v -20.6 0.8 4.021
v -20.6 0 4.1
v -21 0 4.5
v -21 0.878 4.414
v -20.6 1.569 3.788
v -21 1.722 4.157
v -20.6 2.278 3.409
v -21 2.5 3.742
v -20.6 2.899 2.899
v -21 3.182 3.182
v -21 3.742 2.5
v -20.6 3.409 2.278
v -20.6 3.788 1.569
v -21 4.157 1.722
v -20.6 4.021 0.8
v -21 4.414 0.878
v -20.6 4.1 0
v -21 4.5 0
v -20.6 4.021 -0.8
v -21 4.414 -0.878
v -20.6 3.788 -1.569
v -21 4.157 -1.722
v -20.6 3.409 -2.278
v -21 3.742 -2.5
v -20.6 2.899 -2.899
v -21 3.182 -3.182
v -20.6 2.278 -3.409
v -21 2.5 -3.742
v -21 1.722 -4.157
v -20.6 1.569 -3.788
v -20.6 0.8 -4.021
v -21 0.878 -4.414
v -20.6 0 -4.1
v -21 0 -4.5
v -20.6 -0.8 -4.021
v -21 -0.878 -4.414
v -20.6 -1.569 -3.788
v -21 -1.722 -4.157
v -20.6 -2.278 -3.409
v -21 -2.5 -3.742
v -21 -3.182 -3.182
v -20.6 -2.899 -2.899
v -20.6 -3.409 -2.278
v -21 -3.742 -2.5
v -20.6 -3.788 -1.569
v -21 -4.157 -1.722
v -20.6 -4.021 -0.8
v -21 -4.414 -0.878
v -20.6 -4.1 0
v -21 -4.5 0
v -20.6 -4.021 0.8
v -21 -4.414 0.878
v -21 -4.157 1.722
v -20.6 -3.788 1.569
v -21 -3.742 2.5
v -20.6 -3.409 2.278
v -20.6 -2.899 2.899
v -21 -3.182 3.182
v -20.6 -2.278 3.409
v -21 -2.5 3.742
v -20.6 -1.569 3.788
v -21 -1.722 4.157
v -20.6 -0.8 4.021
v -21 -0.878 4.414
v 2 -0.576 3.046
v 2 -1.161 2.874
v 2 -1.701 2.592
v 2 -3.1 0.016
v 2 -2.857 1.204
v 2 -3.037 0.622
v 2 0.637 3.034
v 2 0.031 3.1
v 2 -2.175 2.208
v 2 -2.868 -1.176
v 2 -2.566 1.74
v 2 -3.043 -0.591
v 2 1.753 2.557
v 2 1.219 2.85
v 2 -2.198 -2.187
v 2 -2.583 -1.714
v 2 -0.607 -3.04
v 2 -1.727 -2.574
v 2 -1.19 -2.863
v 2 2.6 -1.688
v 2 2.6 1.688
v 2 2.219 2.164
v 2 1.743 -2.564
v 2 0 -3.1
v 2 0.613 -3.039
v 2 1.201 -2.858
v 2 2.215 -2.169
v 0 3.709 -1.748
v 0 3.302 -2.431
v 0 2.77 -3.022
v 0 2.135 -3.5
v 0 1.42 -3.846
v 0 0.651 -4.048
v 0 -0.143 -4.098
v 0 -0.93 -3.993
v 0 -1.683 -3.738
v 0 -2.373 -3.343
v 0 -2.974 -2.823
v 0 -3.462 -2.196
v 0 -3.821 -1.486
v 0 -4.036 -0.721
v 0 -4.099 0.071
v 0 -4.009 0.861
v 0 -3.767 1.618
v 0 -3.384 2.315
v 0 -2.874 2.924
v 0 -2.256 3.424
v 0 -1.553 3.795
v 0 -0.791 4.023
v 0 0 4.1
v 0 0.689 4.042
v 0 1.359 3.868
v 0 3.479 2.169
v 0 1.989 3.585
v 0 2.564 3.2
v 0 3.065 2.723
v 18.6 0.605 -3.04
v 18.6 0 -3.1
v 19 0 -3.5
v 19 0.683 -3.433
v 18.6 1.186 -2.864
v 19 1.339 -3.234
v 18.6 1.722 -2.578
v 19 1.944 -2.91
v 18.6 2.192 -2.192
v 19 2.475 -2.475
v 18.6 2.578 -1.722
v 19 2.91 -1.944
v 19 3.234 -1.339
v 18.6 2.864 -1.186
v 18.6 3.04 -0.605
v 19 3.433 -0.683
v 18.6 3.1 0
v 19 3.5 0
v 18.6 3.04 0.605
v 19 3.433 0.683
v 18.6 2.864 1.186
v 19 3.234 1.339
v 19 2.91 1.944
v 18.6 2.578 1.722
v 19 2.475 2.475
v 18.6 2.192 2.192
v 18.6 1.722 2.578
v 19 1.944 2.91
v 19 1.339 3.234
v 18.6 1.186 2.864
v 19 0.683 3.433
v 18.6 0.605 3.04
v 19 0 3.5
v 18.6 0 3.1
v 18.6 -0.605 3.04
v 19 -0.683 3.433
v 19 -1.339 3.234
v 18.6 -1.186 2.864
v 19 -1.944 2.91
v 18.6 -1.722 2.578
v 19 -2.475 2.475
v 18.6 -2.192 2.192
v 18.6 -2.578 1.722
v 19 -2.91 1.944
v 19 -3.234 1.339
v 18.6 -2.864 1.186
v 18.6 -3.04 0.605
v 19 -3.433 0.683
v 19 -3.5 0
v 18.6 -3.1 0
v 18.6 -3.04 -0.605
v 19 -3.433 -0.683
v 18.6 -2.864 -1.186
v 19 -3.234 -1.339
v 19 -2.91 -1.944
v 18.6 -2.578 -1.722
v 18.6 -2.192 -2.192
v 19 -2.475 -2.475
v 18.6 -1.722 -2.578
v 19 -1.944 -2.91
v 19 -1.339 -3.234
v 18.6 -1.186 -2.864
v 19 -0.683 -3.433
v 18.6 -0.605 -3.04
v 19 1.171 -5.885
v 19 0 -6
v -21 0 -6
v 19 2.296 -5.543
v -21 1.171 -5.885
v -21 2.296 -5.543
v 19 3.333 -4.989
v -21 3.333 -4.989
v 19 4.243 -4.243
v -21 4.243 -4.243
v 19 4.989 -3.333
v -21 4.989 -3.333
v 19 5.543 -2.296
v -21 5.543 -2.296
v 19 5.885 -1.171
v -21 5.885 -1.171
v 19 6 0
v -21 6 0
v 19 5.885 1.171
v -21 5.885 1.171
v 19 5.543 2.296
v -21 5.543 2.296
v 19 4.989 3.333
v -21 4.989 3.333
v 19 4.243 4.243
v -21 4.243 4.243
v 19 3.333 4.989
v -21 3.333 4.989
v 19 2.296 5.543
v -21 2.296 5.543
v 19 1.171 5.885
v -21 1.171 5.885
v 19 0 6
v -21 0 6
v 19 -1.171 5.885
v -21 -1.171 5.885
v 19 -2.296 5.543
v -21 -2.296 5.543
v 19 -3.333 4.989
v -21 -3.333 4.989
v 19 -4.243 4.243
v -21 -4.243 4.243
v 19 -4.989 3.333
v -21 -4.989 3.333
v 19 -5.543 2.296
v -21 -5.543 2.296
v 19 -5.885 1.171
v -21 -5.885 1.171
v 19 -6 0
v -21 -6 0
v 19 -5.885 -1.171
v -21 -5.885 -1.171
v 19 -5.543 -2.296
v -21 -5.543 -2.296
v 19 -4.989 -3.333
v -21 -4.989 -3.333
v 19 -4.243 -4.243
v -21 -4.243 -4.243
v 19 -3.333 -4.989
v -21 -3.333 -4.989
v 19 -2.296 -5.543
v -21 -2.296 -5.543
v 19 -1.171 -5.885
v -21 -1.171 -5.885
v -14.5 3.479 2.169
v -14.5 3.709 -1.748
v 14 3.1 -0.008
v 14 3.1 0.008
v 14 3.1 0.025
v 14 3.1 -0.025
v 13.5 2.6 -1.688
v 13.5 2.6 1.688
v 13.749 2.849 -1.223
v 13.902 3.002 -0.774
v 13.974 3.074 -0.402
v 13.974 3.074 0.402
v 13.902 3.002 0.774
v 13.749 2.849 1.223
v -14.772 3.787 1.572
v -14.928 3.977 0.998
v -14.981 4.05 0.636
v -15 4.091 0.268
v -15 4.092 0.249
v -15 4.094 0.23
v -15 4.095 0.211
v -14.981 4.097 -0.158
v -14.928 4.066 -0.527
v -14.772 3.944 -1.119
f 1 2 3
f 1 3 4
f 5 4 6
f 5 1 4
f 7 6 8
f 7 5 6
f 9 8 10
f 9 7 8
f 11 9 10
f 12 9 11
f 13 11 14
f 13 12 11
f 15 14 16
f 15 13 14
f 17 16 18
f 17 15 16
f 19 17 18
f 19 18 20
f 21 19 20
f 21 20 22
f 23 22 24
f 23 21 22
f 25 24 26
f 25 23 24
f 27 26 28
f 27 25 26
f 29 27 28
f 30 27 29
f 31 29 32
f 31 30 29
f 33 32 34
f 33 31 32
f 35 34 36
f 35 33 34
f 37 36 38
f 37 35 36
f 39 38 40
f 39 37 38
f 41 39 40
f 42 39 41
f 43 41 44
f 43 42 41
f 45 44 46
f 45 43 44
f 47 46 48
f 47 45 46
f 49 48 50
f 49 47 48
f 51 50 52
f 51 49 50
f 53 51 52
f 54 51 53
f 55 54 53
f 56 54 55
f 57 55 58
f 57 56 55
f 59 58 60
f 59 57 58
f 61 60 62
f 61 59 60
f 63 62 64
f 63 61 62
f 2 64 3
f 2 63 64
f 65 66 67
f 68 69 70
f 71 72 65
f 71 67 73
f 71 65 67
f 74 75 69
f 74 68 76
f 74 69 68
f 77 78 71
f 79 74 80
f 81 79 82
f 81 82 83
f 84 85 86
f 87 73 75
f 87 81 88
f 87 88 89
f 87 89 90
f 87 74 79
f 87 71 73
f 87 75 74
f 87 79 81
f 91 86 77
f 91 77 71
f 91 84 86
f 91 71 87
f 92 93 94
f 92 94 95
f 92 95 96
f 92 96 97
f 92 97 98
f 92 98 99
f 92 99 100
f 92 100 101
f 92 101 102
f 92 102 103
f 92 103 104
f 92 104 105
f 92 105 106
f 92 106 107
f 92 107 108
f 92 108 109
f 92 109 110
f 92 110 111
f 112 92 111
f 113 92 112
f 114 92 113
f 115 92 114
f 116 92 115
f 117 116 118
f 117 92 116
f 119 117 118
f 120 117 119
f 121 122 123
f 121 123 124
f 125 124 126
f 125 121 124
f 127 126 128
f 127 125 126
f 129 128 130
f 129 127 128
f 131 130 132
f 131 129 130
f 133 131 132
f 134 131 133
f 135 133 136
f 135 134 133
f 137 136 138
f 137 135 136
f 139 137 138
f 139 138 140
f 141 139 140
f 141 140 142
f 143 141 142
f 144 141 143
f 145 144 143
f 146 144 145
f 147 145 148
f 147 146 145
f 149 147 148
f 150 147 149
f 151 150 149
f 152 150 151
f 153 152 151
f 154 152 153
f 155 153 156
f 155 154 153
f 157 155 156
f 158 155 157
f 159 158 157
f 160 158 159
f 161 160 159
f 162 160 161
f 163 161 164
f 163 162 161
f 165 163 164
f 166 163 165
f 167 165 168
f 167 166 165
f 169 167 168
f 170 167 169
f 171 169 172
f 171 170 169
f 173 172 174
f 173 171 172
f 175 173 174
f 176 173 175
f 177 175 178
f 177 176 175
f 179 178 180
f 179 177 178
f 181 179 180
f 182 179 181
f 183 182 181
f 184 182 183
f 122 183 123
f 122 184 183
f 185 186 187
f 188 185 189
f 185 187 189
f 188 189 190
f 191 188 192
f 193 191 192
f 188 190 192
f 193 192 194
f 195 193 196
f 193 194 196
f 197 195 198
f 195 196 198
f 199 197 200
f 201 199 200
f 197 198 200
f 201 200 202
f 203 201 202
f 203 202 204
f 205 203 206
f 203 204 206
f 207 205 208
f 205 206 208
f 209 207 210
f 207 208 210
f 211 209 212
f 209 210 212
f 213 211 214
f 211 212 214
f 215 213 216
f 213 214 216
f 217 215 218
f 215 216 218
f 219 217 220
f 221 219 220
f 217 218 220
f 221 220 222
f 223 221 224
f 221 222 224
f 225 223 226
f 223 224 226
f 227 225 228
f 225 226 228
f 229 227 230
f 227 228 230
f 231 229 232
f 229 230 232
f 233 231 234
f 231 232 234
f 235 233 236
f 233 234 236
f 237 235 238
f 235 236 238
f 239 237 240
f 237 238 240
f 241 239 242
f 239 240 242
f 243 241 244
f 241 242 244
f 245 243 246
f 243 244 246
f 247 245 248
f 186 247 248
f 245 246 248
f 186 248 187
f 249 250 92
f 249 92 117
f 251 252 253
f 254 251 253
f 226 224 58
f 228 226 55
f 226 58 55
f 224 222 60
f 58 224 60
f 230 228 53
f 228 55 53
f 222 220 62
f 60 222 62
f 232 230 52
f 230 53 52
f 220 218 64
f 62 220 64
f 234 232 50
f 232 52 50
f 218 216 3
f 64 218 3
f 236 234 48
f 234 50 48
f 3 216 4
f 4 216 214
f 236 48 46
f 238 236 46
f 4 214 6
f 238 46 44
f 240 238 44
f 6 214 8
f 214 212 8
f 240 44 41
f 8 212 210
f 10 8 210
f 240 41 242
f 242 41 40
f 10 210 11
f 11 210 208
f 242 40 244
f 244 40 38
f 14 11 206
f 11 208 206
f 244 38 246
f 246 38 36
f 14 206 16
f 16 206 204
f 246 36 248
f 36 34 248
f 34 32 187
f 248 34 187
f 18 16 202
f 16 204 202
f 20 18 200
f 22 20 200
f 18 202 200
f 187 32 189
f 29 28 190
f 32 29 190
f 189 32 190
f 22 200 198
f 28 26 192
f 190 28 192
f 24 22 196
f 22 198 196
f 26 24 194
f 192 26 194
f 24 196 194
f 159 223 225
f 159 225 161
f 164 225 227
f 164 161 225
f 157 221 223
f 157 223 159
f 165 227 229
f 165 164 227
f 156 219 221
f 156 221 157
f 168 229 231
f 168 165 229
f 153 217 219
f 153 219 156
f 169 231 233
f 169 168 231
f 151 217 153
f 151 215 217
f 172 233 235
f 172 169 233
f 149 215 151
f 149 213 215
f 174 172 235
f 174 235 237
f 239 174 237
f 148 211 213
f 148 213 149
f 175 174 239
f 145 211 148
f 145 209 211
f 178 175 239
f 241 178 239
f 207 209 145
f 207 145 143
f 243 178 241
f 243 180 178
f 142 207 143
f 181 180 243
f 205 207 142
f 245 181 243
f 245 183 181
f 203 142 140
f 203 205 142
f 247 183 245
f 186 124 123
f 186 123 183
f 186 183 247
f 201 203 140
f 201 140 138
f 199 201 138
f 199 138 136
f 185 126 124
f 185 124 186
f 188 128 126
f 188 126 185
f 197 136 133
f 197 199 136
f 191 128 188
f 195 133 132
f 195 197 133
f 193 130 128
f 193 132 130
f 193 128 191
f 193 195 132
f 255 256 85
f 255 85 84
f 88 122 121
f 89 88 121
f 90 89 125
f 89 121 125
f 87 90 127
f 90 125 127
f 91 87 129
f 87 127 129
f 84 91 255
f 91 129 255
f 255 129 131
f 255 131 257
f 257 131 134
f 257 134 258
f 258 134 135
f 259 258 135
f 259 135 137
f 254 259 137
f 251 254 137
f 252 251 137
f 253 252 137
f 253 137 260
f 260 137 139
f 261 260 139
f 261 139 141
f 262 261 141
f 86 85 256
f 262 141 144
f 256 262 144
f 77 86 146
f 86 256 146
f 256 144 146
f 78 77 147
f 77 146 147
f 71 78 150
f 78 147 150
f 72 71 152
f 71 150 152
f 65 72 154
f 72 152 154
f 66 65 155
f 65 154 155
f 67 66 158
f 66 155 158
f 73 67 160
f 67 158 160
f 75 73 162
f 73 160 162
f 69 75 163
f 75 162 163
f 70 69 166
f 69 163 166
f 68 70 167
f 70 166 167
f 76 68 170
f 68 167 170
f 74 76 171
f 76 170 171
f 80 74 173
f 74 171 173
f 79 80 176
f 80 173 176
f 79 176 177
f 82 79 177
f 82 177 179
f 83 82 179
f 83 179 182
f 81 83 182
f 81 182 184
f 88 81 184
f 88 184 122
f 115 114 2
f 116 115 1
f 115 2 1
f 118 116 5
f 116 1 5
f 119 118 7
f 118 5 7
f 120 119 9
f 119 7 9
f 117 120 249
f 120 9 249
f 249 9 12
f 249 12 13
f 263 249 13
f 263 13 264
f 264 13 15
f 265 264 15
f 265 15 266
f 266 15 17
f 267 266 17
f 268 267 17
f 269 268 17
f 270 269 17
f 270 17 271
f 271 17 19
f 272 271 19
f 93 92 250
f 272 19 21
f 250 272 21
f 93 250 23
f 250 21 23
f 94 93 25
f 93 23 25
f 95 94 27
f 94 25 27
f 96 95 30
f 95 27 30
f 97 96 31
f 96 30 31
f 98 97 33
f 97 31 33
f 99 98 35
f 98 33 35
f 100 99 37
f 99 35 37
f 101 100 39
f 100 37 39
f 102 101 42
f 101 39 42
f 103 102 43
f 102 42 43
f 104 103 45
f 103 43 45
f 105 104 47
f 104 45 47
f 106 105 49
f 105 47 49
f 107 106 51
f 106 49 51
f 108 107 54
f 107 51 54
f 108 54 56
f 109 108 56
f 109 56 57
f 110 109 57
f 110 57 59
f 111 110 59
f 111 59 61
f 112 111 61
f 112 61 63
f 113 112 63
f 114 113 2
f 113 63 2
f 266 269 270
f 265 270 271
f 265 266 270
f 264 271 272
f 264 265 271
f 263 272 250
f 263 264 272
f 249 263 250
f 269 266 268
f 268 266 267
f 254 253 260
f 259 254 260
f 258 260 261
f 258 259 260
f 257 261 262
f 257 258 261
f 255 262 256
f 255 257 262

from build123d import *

# Parameters (mm, degrees)
EXTRUDE_1_DEPTH      = 19
EXTRUDE_1_DEPTH_BACK = 21
SKETCH_1_R           = 6
SKETCH_3_R           = 3.1
CUT_EXTRUDE_1_DEPTH  = 17
SKETCH_4_R           = 4.1
CUT_EXTRUDE_2_DEPTH  = 21
EXTRUDE_START        = 12
EXTRUDE_2_DEPTH      = 12
EXTRUDE_START_2      = 15
EXTRUDE_3_DEPTH      = 15
CHAMFER_1_SIZE       = 0.4
CHAMFER_2_SIZE       = 0.5


with BuildPart() as part:
    # 草图1 → 凸台-拉伸1 (new, two sides: drawn at the far end of the back side and taken through both)
    with BuildSketch(Plane(origin=(0, 0, 0), x_dir=(0, 0, -1), z_dir=(1, 0, 0)).offset(-EXTRUDE_1_DEPTH_BACK)):
        Circle(SKETCH_1_R)
    extrude(amount=EXTRUDE_1_DEPTH + EXTRUDE_1_DEPTH_BACK)

    # 草图3 → 切除-拉伸1 (cut)
    with BuildSketch(Plane(origin=(19, 0, 0), x_dir=(0, 0, -1), z_dir=(1, 0, 0))):
        Circle(SKETCH_3_R)
    extrude(amount=-CUT_EXTRUDE_1_DEPTH, mode=Mode.SUBTRACT)

    # 草图4 → 切除-拉伸2 (cut)
    with BuildSketch(Plane.ZY.offset(21)):
        Circle(SKETCH_4_R)
    extrude(amount=-CUT_EXTRUDE_2_DEPTH, mode=Mode.SUBTRACT)

    # 草图5 → 凸台-拉伸2 (add)
    with BuildSketch(Plane(origin=(2, 0, 0), x_dir=(0, 0, -1), z_dir=(1, 0, 0)).offset(EXTRUDE_START)):
        with BuildLine():
            Line((-1.688194302, 2.6), (1.688194302, 2.6))
            ThreePointArc((1.688194302, 2.6), (0, 3.1), (-1.688194302, 2.6))
        make_face()
    extrude(amount=-EXTRUDE_2_DEPTH)

    # 草图6 → 凸台-拉伸3 (add)
    with BuildSketch(Plane.ZY.offset(EXTRUDE_START_2)):
        with BuildLine():
            Line((-1.748205844, 3.708608408), (2.169358352, 3.479063716))
            ThreePointArc((2.169358352, 3.479063716), (0.239822956, 4.09297996), (-1.748205844, 3.708608408))
        make_face()
    extrude(amount=-EXTRUDE_3_DEPTH)

    # 倒角1
    chamfer_1_edges = [part.edges().sort_by_distance(p)[0] for p in [
        (-21, 0, -4.1),
        (19, 0, 3.1),
    ]]
    chamfer(chamfer_1_edges, length=CHAMFER_1_SIZE)

    # 倒角2
    chamfer_2_edges = [part.edges().sort_by_distance(p)[0] for p in [
        (-15, 3.593836062, 0.210576254),
        (14, 2.6, 0),
    ]]
    chamfer(chamfer_2_edges, length=CHAMFER_2_SIZE - 0.0001)  # a hair under: the kernel refuses the full size


solid = part.part
